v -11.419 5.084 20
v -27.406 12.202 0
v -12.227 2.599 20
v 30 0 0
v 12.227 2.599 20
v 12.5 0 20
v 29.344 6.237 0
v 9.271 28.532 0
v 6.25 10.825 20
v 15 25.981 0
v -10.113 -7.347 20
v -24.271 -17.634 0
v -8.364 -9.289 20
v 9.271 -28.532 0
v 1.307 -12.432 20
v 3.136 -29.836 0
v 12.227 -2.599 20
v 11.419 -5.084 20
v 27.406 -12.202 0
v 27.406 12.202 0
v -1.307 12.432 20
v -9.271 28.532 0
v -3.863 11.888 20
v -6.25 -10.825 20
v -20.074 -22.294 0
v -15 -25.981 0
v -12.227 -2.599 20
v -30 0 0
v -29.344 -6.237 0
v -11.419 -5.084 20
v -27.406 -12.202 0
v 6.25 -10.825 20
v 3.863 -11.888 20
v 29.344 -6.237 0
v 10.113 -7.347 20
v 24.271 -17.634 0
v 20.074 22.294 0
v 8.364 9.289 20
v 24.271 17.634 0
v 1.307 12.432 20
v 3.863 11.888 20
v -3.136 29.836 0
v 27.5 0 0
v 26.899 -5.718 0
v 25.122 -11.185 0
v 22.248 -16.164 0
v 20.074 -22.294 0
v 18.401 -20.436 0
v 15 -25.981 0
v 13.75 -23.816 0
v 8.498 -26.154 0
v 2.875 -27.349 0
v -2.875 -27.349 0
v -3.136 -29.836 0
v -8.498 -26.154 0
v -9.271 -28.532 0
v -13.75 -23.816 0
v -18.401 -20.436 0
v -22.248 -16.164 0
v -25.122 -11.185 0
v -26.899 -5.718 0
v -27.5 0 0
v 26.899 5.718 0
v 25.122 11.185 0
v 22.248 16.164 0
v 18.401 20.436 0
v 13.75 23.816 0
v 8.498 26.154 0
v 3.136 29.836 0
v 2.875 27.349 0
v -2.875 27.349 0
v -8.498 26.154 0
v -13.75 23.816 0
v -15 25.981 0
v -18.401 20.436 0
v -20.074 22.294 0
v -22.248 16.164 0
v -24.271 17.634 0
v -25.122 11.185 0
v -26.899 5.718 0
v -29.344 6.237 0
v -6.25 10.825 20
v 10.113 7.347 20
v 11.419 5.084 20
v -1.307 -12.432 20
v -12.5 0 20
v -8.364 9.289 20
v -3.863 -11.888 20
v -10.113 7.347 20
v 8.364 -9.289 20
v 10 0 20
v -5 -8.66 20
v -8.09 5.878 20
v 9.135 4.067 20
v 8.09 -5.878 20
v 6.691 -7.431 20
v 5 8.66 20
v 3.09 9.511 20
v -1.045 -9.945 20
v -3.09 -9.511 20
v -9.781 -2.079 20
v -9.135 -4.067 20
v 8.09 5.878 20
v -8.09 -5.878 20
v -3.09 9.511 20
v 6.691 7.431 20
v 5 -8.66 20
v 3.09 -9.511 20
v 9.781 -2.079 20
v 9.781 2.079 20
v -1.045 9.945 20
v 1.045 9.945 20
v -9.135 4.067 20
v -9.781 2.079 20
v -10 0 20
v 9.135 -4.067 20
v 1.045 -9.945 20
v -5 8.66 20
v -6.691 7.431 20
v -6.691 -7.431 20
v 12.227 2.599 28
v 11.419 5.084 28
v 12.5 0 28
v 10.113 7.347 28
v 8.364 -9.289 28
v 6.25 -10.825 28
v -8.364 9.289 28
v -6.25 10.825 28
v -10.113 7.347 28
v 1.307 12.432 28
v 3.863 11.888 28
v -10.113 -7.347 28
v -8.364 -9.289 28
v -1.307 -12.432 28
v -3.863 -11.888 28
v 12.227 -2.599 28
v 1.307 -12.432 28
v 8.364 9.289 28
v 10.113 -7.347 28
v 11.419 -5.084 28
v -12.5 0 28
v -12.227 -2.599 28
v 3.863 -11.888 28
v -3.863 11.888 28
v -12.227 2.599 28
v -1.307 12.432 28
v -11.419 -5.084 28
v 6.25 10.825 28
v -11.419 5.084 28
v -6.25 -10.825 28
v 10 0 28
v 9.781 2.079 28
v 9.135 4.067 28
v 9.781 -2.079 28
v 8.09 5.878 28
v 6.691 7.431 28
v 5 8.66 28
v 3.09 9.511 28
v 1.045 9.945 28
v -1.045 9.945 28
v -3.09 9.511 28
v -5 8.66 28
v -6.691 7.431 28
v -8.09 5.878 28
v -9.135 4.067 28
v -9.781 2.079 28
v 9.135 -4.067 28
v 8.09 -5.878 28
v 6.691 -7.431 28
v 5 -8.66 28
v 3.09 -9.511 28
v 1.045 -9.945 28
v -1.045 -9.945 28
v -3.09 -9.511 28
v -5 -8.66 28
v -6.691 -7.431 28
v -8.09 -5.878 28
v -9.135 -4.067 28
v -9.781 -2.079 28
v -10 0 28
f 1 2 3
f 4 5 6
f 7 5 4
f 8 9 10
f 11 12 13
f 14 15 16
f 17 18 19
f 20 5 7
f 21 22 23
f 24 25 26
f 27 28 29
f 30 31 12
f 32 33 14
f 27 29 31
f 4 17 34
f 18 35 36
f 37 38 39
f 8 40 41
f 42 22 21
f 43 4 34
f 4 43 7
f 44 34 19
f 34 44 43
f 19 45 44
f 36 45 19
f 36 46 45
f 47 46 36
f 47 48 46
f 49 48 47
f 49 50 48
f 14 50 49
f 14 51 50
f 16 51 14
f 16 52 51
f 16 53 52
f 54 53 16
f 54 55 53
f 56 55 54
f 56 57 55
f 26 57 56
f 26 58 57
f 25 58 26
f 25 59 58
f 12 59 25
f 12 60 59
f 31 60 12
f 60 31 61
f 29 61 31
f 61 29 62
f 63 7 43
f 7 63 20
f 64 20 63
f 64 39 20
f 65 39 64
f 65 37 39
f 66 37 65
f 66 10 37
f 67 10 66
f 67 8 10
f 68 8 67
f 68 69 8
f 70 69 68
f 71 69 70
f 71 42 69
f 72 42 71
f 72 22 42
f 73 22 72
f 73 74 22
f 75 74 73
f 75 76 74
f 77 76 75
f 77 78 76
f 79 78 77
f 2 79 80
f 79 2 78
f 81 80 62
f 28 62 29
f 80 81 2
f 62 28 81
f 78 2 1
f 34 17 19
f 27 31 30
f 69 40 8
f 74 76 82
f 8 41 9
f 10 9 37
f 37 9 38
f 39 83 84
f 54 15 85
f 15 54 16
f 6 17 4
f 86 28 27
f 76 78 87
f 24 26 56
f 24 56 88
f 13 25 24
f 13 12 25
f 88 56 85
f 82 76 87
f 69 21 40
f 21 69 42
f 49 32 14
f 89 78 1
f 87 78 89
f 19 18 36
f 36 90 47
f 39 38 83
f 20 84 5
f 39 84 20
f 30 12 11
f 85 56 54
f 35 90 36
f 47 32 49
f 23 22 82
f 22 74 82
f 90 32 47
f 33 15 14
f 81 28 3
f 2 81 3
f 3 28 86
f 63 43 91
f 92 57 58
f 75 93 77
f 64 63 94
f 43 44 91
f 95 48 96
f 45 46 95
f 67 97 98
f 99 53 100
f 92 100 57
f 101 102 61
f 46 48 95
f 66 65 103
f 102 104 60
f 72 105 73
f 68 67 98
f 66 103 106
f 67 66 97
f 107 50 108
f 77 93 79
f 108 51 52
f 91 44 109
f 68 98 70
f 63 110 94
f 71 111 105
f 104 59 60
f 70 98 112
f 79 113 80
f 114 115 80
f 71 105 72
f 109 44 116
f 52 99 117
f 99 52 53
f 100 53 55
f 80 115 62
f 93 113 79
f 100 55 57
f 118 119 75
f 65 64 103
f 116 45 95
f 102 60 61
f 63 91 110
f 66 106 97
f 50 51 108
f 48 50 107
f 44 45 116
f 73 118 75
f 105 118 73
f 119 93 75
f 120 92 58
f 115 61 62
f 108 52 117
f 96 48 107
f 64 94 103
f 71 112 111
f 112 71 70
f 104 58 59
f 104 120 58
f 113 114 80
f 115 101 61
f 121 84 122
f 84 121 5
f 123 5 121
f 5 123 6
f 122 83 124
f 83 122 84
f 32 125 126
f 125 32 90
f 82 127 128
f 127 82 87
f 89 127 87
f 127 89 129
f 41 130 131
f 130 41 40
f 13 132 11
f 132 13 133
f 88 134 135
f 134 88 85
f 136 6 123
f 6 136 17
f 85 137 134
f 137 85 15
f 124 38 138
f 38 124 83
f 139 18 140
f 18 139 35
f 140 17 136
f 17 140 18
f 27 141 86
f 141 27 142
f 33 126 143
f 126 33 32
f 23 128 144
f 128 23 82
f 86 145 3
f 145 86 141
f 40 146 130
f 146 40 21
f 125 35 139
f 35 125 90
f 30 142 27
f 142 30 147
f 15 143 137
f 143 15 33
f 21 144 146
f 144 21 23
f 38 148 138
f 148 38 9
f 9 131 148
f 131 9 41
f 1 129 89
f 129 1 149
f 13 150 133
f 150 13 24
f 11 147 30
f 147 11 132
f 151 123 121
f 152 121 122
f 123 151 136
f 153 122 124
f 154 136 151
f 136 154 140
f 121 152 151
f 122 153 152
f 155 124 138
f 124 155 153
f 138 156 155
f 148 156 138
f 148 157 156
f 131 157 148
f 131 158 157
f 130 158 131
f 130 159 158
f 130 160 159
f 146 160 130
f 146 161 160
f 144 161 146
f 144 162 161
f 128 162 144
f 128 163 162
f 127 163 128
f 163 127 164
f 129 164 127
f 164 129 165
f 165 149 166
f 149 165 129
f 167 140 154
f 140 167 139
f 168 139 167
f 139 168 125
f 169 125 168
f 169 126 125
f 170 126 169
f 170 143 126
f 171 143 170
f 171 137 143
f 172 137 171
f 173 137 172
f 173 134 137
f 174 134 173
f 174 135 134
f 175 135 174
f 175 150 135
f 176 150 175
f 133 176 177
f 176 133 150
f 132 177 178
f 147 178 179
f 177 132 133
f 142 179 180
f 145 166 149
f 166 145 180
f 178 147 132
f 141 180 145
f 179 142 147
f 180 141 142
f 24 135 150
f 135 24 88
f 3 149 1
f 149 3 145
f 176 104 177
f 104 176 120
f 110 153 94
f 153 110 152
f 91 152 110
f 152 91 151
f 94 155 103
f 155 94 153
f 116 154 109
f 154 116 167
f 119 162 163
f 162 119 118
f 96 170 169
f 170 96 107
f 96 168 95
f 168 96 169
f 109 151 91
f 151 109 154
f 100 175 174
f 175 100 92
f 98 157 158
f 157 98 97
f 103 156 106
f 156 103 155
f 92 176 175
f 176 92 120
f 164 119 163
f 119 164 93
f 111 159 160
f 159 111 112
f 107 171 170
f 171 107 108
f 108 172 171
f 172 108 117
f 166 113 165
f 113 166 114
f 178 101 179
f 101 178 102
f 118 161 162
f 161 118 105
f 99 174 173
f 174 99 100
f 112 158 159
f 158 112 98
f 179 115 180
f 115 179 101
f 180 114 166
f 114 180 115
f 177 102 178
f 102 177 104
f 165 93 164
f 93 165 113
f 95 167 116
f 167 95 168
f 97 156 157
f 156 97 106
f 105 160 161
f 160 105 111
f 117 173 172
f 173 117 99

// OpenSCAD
// Parametric Funnel by Coasterman
// Modified by asp55

// VARIABLES
bottom_diameter = 60;
cone_height = 20;
top_diameter = 25;
top_height = 8;
width = 2.5;

// CODE
union()
{
difference()
{
cylinder(h=cone_height, r1=bottom_diameter/2, r2 = top_diameter/2);

cylinder(h=cone_height, r1=bottom_diameter/2 - width, r2 = top_diameter/2 - width);
}
translate([0, 0, cone_height])
{
difference()
{
cylinder(h=top_height, r=top_diameter/2);
cylinder(h=top_height, r=top_diameter/2 - width);
}
}
}
